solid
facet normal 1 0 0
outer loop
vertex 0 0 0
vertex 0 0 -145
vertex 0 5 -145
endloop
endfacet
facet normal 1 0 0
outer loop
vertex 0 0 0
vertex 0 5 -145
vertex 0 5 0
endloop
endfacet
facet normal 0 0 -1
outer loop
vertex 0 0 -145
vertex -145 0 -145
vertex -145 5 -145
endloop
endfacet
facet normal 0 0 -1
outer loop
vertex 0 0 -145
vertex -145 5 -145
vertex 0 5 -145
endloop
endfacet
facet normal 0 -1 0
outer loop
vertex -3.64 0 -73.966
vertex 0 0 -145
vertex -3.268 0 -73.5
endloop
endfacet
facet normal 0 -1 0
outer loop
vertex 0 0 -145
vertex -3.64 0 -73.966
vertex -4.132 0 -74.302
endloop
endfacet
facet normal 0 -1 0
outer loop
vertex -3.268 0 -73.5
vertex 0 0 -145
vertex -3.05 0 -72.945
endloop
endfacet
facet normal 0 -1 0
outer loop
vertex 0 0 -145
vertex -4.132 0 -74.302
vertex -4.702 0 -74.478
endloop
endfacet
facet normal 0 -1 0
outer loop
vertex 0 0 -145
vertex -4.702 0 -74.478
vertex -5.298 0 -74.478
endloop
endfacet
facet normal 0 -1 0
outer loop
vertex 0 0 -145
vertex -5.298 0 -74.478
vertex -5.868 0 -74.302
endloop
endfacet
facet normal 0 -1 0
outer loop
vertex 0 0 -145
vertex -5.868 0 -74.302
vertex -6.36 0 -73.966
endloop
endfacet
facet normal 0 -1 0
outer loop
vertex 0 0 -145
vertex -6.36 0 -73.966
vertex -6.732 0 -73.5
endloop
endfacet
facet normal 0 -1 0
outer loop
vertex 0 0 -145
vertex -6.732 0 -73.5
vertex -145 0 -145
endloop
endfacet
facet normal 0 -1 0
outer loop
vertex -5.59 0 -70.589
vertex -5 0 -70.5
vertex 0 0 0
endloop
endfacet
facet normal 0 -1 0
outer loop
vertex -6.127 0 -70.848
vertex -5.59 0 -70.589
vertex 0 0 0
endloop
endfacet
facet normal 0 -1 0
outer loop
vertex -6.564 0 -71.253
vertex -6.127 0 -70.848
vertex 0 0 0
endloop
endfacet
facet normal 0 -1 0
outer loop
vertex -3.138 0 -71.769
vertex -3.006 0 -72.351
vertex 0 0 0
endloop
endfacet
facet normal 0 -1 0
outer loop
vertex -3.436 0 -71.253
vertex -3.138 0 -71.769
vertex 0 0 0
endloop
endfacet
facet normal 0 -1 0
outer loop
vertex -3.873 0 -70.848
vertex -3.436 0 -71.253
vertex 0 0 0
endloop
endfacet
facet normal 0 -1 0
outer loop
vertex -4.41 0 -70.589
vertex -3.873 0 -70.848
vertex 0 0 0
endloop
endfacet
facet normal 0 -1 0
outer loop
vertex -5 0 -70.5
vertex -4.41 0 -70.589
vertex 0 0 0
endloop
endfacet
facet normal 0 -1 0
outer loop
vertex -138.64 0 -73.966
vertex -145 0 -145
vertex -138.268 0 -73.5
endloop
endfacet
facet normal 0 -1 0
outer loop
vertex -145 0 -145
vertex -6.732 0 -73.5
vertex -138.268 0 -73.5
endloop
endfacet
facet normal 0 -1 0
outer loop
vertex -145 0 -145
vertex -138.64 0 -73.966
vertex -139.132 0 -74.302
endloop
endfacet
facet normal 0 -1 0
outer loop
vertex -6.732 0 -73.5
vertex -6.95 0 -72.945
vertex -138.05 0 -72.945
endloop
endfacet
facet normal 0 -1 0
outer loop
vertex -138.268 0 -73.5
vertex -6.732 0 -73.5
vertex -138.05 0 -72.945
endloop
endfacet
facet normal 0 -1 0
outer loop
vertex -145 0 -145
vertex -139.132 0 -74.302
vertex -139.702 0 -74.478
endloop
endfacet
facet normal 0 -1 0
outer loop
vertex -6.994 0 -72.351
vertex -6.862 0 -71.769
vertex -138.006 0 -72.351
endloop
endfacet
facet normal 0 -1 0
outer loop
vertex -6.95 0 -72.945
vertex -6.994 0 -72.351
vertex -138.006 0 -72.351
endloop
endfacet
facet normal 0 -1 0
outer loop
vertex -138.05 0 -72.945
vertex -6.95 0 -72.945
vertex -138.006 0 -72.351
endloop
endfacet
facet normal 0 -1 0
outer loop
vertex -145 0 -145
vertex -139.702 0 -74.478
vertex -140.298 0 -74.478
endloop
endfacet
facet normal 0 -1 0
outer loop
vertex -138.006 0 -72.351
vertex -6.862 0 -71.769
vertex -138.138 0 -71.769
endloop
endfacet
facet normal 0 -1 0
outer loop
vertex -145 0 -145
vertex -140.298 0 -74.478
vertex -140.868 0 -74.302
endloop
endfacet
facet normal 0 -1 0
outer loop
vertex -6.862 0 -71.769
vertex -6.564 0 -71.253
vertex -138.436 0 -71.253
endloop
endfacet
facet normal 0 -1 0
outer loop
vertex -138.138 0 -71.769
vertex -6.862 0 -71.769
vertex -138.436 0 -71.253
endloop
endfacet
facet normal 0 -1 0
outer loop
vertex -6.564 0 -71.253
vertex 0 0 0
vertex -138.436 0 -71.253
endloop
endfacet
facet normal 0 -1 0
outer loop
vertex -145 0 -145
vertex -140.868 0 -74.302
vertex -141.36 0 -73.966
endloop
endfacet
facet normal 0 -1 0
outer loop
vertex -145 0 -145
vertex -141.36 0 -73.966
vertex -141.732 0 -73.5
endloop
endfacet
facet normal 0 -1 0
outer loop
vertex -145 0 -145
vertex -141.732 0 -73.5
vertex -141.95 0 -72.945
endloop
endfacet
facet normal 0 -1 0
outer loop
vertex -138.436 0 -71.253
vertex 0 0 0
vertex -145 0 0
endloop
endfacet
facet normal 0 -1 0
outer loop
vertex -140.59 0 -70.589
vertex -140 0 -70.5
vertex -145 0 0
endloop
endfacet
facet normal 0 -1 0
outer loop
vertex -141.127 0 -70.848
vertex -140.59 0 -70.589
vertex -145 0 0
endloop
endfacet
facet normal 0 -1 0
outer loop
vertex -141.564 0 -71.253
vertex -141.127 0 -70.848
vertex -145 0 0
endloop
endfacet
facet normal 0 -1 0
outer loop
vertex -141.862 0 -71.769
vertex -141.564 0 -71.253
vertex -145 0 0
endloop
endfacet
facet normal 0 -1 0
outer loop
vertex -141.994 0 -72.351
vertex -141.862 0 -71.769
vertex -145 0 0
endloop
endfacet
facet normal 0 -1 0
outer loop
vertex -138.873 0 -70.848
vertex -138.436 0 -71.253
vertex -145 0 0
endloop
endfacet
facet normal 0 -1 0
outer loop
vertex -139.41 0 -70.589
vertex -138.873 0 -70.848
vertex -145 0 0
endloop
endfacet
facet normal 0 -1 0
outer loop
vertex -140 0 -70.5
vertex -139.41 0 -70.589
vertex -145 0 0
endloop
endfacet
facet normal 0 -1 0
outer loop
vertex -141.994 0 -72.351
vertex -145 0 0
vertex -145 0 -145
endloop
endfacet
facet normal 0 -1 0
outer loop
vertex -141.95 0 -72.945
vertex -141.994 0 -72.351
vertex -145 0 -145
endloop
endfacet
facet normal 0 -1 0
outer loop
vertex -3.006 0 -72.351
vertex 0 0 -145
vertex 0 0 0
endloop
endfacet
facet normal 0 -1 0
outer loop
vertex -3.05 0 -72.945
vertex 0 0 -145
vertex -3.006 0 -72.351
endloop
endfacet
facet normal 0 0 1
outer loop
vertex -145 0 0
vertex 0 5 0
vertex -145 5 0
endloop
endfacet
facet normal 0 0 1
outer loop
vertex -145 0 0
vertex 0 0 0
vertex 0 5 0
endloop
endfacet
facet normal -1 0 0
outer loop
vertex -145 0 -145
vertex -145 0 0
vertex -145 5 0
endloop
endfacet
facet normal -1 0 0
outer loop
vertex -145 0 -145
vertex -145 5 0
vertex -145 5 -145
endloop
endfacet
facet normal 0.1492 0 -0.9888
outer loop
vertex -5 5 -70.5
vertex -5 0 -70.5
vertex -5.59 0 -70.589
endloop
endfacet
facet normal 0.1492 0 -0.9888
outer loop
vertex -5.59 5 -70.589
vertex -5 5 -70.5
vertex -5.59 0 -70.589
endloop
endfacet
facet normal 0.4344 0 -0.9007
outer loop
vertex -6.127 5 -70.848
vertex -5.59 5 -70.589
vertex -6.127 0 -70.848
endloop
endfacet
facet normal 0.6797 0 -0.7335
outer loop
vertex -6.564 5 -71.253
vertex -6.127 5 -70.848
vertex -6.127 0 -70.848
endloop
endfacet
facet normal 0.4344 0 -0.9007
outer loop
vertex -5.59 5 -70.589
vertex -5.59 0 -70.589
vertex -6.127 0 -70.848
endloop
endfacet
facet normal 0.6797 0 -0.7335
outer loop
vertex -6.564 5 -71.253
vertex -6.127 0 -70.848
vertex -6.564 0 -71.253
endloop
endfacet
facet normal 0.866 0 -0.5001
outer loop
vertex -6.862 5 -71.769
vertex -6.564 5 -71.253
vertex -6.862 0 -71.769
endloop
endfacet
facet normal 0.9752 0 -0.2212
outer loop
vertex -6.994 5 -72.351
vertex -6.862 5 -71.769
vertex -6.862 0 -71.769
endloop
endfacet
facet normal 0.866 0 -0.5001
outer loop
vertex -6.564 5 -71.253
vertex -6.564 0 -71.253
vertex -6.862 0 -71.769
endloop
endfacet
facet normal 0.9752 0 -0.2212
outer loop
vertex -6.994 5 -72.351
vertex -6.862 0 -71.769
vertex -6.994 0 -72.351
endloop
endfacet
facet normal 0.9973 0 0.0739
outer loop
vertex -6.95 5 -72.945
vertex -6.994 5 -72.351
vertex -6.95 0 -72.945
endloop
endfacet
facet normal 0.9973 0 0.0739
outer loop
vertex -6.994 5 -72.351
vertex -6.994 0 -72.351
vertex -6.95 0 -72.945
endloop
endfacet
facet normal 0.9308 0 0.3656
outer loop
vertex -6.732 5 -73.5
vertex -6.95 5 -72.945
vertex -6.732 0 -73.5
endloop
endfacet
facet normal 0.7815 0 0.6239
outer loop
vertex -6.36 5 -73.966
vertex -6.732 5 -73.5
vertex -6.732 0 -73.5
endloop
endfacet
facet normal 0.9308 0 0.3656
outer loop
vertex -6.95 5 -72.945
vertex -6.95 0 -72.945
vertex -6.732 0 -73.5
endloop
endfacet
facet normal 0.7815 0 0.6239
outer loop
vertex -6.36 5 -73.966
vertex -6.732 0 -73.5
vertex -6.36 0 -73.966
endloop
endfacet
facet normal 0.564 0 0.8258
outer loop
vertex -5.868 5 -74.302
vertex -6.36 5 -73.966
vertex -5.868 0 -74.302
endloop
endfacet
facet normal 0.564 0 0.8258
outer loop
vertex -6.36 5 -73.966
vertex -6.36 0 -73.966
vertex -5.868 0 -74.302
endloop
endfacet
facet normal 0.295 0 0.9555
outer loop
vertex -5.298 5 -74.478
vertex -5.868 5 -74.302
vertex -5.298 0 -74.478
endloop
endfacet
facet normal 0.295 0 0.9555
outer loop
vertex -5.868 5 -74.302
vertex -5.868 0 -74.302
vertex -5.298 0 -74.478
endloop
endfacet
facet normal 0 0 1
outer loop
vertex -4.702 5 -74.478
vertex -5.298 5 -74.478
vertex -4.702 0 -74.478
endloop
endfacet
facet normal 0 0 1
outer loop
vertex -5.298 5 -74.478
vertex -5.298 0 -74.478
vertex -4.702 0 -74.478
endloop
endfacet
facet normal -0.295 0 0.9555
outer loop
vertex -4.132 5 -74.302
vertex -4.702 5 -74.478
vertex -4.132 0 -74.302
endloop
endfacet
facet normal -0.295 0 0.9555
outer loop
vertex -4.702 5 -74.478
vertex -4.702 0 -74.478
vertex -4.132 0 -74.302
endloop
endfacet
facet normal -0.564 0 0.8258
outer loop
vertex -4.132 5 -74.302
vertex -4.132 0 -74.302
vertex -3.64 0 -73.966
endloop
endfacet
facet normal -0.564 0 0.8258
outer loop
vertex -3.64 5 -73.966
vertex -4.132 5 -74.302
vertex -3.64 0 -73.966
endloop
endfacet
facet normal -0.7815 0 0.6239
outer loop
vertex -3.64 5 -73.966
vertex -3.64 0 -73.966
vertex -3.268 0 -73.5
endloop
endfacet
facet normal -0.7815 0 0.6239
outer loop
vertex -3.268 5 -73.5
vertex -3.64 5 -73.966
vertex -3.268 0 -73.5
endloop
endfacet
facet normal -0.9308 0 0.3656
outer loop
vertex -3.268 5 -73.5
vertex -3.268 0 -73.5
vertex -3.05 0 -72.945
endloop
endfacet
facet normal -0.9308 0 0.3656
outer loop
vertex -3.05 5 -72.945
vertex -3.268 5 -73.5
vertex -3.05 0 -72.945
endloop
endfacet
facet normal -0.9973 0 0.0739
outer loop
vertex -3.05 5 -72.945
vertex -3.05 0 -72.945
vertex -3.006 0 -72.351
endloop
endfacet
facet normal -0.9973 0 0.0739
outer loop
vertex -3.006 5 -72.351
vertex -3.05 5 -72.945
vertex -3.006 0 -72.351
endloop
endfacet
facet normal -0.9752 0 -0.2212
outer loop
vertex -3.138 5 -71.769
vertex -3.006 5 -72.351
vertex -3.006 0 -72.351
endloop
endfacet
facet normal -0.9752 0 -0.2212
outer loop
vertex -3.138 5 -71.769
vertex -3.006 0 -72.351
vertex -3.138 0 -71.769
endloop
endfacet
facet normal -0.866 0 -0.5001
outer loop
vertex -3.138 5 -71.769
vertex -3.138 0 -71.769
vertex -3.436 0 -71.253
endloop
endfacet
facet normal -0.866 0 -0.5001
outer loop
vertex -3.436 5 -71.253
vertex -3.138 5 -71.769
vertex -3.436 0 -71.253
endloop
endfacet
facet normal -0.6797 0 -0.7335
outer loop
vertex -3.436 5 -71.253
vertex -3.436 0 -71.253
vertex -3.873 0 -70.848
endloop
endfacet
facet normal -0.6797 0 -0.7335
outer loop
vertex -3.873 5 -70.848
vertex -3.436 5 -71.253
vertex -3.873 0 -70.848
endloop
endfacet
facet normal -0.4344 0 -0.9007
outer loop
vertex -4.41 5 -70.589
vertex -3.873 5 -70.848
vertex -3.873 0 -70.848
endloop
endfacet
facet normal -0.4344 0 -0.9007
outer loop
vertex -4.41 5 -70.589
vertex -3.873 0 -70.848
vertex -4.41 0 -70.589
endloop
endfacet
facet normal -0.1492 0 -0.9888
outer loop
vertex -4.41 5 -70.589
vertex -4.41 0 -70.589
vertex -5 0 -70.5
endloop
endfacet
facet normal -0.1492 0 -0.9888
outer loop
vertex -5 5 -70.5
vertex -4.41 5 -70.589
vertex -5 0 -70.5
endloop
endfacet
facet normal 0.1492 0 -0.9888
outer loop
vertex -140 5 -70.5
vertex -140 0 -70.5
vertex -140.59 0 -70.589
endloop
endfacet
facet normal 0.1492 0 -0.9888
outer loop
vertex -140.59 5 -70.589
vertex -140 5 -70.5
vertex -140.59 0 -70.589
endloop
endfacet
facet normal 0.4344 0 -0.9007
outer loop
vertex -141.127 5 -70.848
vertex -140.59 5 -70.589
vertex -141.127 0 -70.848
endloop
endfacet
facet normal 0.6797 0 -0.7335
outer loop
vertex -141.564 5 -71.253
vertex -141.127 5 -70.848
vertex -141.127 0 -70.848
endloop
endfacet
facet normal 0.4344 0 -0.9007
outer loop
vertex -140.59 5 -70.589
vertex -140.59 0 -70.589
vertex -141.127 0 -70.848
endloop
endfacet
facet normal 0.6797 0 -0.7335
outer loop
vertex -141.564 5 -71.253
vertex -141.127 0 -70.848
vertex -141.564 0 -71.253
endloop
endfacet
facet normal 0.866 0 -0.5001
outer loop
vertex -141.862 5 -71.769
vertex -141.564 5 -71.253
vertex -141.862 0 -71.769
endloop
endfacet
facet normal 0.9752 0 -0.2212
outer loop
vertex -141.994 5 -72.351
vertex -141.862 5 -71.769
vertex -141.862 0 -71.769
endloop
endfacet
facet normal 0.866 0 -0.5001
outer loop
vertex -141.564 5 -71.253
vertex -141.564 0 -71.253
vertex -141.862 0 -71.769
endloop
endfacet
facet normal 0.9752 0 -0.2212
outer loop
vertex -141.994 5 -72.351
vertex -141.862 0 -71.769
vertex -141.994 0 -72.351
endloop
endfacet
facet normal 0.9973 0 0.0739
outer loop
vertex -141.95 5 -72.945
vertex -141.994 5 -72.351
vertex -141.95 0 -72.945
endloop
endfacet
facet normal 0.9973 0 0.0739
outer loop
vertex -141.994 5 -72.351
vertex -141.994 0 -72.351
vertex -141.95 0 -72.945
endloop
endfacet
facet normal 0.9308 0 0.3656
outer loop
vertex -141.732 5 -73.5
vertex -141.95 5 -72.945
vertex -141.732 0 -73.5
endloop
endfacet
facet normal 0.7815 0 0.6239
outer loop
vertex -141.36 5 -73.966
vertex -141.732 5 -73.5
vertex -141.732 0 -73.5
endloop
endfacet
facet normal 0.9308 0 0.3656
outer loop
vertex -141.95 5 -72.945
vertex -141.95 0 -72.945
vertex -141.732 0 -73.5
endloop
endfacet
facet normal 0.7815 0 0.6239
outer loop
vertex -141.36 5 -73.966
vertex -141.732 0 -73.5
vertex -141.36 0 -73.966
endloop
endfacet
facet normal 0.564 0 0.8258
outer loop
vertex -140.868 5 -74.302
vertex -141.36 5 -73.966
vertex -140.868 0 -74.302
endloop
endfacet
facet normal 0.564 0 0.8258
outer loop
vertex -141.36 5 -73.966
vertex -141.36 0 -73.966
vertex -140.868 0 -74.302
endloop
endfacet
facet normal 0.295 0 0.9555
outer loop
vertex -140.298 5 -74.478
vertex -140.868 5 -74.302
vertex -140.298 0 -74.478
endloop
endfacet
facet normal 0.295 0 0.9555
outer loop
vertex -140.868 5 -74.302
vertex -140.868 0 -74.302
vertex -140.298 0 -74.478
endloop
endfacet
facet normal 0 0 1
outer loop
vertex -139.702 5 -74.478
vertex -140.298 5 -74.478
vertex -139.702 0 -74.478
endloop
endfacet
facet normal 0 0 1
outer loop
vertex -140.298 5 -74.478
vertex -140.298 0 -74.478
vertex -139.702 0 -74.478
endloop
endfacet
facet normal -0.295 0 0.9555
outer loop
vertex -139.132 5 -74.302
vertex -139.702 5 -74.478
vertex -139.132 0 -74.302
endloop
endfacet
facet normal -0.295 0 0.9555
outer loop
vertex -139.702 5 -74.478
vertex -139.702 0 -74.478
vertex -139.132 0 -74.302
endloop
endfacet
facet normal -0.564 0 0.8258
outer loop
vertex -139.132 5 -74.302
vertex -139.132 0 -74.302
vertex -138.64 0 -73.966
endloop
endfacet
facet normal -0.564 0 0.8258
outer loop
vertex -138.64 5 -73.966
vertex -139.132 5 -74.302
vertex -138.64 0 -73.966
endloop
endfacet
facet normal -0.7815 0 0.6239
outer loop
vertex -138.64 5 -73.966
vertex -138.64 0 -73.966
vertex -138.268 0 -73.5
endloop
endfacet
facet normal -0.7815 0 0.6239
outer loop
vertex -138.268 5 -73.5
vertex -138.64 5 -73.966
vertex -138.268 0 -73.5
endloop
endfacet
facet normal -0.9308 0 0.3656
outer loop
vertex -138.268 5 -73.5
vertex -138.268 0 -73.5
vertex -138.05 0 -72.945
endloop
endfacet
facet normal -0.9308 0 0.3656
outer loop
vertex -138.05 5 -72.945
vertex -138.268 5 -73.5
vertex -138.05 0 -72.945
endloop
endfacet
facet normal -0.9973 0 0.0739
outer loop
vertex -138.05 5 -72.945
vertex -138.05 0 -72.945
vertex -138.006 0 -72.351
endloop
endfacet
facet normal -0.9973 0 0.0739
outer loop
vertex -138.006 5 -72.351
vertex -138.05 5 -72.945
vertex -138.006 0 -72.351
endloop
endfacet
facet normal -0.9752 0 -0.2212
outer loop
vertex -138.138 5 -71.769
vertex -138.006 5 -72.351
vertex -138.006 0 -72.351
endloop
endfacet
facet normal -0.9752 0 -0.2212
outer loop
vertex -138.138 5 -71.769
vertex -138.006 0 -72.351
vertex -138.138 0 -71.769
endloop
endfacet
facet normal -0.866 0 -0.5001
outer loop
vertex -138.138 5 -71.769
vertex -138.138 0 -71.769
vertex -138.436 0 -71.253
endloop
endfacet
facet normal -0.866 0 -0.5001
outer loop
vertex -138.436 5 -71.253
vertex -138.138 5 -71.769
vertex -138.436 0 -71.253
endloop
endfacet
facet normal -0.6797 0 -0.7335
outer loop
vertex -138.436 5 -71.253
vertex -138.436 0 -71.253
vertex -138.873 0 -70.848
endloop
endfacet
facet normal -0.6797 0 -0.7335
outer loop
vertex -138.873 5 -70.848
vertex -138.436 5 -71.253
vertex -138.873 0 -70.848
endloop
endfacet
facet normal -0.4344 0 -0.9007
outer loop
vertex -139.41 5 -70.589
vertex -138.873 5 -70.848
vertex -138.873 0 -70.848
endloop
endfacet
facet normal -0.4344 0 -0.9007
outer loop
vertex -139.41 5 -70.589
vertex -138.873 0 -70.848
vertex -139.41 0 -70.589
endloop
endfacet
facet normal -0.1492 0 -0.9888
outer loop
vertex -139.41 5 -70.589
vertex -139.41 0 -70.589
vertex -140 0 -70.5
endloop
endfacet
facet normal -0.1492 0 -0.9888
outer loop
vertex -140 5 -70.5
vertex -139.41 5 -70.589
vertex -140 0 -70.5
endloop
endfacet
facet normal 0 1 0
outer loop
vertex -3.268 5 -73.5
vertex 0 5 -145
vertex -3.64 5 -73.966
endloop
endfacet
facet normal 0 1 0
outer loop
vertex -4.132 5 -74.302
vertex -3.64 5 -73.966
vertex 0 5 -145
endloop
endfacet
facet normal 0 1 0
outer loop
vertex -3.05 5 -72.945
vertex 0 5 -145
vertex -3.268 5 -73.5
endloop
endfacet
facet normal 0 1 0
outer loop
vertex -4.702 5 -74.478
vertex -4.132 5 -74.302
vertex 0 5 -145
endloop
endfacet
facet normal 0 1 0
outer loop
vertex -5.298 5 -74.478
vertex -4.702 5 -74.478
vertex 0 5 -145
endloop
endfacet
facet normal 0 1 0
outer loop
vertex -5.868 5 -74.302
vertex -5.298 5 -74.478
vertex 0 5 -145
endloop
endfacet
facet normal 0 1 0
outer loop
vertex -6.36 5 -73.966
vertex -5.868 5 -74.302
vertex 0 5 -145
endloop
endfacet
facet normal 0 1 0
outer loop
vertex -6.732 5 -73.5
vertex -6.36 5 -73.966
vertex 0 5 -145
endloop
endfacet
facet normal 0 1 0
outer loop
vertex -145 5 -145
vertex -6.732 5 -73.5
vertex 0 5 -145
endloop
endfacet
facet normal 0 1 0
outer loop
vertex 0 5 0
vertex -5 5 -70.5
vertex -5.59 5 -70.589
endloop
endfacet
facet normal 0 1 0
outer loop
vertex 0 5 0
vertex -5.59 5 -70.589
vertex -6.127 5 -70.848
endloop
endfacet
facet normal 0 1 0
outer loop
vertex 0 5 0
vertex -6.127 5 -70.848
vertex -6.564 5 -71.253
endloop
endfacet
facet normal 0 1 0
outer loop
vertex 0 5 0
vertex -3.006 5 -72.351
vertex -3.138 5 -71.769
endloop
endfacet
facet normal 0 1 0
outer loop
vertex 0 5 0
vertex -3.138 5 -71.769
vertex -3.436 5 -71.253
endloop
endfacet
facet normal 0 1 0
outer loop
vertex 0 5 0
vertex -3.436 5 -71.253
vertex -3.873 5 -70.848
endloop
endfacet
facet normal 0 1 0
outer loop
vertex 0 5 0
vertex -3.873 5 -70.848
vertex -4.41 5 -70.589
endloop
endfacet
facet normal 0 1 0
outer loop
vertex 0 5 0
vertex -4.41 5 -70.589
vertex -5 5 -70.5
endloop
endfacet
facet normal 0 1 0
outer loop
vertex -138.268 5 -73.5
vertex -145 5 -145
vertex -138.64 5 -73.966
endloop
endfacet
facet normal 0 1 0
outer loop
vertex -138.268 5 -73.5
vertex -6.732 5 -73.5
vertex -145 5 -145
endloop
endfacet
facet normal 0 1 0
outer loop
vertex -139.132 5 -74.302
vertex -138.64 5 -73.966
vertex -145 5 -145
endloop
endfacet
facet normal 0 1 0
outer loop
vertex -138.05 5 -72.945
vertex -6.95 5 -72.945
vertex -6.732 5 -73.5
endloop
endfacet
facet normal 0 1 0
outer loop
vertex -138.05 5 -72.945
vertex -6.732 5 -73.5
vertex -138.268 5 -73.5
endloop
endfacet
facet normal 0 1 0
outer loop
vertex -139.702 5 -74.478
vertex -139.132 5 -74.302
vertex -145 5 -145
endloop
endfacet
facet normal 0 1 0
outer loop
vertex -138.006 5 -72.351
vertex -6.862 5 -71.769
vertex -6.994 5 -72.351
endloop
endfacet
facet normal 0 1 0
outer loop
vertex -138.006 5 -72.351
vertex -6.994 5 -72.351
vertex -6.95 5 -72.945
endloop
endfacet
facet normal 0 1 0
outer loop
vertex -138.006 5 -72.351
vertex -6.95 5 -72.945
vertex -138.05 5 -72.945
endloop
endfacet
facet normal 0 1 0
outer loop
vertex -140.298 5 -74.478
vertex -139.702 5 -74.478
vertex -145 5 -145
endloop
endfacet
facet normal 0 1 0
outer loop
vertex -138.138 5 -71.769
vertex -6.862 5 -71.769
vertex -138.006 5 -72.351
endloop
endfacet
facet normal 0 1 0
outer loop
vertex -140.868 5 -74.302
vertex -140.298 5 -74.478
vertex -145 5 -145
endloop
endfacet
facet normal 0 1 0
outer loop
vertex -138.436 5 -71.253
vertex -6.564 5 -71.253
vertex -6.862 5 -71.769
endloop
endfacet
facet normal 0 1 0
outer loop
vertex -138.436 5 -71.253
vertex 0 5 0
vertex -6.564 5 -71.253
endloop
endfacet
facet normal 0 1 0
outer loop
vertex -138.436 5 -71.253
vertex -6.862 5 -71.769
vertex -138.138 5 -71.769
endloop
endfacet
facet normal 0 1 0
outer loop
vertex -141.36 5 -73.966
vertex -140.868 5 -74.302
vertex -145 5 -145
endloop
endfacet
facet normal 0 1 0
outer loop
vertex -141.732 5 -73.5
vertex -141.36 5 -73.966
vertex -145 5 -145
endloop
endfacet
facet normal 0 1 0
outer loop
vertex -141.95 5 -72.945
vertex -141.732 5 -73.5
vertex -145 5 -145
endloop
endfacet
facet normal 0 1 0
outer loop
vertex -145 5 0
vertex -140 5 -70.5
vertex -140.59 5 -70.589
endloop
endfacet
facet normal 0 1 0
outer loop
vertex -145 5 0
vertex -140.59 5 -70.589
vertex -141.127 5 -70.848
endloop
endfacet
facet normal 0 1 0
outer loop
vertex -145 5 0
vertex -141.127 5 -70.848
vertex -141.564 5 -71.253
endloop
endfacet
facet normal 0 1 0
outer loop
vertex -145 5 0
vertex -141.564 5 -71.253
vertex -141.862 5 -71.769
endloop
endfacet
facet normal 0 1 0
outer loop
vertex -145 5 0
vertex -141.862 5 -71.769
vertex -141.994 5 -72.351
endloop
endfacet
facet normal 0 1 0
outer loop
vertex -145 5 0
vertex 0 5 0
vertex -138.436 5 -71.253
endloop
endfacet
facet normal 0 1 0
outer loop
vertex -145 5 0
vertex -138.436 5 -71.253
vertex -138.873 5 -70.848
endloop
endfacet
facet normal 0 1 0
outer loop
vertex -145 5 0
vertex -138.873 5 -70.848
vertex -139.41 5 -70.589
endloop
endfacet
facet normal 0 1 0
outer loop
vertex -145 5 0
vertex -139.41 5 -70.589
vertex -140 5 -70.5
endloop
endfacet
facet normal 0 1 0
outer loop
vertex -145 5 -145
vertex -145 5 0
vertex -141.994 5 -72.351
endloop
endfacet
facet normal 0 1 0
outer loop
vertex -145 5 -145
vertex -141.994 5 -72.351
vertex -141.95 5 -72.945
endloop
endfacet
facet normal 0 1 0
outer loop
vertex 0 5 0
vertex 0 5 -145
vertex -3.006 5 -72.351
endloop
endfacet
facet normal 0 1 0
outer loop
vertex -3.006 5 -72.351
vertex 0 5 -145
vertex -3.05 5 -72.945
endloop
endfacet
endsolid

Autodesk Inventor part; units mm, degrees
ref_plane "YZ Plane" through (0, 0, 0) normal (1, 0, 0) x (0, 1, 0)
ref_plane "XZ Plane" through (0, 0, 0) normal (0, 1, 0) x (-1, 0, 0)
ref_plane "XY Plane" through (0, 0, 0) normal (0, 0, 1) x (1, 0, 0)
sketch "Sketch1" plane through (0, 0, 0) normal (0, 1, 0) x (-1, 0, 0)
  line L0 (0, 0) -> (145, 0)
  line L1 (145, 0) -> (145, -145)
  line L2 (145, -145) -> (0, -145)
  line L3 (0, -145) -> (0, 0)
  dimension "d0" = 145
  dimension "d1" = 145
extrude "Extrusion1" add sketch "Sketch1" along normal blind 5
sketch "Sketch2" plane through (0, 5, 0) normal (0, 1, 0) x (1, 0, 0)
  line L0 (-145, 145) -> (-145, 0) projected
  line L1 (0, 145) -> (-145, 145) projected
  point P0 (0, 0)
  point P1 (-140, 72.5)
  dimension "d4" = 5
  dimension "d5" = 72.5
hole "Hole1" at (-140, 5, -72.5) direction (0, -1, 0) diameter 4 end through all
sketch "Sketch3" plane through (0, 5, 0) normal (0, 1, 0) x (1, 0, 0)
  line L0 (0, 0) -> (0, 145) projected
  line L1 (0, 145) -> (-145, 145) projected
  point P0 (-5, 72.5)
  dimension "d13" = 5
  dimension "d14" = 72.5
hole "Hole2" at (-5, 5, -72.5) direction (0, -1, 0) diameter 4 end through all
properties part number "pot_mover"
